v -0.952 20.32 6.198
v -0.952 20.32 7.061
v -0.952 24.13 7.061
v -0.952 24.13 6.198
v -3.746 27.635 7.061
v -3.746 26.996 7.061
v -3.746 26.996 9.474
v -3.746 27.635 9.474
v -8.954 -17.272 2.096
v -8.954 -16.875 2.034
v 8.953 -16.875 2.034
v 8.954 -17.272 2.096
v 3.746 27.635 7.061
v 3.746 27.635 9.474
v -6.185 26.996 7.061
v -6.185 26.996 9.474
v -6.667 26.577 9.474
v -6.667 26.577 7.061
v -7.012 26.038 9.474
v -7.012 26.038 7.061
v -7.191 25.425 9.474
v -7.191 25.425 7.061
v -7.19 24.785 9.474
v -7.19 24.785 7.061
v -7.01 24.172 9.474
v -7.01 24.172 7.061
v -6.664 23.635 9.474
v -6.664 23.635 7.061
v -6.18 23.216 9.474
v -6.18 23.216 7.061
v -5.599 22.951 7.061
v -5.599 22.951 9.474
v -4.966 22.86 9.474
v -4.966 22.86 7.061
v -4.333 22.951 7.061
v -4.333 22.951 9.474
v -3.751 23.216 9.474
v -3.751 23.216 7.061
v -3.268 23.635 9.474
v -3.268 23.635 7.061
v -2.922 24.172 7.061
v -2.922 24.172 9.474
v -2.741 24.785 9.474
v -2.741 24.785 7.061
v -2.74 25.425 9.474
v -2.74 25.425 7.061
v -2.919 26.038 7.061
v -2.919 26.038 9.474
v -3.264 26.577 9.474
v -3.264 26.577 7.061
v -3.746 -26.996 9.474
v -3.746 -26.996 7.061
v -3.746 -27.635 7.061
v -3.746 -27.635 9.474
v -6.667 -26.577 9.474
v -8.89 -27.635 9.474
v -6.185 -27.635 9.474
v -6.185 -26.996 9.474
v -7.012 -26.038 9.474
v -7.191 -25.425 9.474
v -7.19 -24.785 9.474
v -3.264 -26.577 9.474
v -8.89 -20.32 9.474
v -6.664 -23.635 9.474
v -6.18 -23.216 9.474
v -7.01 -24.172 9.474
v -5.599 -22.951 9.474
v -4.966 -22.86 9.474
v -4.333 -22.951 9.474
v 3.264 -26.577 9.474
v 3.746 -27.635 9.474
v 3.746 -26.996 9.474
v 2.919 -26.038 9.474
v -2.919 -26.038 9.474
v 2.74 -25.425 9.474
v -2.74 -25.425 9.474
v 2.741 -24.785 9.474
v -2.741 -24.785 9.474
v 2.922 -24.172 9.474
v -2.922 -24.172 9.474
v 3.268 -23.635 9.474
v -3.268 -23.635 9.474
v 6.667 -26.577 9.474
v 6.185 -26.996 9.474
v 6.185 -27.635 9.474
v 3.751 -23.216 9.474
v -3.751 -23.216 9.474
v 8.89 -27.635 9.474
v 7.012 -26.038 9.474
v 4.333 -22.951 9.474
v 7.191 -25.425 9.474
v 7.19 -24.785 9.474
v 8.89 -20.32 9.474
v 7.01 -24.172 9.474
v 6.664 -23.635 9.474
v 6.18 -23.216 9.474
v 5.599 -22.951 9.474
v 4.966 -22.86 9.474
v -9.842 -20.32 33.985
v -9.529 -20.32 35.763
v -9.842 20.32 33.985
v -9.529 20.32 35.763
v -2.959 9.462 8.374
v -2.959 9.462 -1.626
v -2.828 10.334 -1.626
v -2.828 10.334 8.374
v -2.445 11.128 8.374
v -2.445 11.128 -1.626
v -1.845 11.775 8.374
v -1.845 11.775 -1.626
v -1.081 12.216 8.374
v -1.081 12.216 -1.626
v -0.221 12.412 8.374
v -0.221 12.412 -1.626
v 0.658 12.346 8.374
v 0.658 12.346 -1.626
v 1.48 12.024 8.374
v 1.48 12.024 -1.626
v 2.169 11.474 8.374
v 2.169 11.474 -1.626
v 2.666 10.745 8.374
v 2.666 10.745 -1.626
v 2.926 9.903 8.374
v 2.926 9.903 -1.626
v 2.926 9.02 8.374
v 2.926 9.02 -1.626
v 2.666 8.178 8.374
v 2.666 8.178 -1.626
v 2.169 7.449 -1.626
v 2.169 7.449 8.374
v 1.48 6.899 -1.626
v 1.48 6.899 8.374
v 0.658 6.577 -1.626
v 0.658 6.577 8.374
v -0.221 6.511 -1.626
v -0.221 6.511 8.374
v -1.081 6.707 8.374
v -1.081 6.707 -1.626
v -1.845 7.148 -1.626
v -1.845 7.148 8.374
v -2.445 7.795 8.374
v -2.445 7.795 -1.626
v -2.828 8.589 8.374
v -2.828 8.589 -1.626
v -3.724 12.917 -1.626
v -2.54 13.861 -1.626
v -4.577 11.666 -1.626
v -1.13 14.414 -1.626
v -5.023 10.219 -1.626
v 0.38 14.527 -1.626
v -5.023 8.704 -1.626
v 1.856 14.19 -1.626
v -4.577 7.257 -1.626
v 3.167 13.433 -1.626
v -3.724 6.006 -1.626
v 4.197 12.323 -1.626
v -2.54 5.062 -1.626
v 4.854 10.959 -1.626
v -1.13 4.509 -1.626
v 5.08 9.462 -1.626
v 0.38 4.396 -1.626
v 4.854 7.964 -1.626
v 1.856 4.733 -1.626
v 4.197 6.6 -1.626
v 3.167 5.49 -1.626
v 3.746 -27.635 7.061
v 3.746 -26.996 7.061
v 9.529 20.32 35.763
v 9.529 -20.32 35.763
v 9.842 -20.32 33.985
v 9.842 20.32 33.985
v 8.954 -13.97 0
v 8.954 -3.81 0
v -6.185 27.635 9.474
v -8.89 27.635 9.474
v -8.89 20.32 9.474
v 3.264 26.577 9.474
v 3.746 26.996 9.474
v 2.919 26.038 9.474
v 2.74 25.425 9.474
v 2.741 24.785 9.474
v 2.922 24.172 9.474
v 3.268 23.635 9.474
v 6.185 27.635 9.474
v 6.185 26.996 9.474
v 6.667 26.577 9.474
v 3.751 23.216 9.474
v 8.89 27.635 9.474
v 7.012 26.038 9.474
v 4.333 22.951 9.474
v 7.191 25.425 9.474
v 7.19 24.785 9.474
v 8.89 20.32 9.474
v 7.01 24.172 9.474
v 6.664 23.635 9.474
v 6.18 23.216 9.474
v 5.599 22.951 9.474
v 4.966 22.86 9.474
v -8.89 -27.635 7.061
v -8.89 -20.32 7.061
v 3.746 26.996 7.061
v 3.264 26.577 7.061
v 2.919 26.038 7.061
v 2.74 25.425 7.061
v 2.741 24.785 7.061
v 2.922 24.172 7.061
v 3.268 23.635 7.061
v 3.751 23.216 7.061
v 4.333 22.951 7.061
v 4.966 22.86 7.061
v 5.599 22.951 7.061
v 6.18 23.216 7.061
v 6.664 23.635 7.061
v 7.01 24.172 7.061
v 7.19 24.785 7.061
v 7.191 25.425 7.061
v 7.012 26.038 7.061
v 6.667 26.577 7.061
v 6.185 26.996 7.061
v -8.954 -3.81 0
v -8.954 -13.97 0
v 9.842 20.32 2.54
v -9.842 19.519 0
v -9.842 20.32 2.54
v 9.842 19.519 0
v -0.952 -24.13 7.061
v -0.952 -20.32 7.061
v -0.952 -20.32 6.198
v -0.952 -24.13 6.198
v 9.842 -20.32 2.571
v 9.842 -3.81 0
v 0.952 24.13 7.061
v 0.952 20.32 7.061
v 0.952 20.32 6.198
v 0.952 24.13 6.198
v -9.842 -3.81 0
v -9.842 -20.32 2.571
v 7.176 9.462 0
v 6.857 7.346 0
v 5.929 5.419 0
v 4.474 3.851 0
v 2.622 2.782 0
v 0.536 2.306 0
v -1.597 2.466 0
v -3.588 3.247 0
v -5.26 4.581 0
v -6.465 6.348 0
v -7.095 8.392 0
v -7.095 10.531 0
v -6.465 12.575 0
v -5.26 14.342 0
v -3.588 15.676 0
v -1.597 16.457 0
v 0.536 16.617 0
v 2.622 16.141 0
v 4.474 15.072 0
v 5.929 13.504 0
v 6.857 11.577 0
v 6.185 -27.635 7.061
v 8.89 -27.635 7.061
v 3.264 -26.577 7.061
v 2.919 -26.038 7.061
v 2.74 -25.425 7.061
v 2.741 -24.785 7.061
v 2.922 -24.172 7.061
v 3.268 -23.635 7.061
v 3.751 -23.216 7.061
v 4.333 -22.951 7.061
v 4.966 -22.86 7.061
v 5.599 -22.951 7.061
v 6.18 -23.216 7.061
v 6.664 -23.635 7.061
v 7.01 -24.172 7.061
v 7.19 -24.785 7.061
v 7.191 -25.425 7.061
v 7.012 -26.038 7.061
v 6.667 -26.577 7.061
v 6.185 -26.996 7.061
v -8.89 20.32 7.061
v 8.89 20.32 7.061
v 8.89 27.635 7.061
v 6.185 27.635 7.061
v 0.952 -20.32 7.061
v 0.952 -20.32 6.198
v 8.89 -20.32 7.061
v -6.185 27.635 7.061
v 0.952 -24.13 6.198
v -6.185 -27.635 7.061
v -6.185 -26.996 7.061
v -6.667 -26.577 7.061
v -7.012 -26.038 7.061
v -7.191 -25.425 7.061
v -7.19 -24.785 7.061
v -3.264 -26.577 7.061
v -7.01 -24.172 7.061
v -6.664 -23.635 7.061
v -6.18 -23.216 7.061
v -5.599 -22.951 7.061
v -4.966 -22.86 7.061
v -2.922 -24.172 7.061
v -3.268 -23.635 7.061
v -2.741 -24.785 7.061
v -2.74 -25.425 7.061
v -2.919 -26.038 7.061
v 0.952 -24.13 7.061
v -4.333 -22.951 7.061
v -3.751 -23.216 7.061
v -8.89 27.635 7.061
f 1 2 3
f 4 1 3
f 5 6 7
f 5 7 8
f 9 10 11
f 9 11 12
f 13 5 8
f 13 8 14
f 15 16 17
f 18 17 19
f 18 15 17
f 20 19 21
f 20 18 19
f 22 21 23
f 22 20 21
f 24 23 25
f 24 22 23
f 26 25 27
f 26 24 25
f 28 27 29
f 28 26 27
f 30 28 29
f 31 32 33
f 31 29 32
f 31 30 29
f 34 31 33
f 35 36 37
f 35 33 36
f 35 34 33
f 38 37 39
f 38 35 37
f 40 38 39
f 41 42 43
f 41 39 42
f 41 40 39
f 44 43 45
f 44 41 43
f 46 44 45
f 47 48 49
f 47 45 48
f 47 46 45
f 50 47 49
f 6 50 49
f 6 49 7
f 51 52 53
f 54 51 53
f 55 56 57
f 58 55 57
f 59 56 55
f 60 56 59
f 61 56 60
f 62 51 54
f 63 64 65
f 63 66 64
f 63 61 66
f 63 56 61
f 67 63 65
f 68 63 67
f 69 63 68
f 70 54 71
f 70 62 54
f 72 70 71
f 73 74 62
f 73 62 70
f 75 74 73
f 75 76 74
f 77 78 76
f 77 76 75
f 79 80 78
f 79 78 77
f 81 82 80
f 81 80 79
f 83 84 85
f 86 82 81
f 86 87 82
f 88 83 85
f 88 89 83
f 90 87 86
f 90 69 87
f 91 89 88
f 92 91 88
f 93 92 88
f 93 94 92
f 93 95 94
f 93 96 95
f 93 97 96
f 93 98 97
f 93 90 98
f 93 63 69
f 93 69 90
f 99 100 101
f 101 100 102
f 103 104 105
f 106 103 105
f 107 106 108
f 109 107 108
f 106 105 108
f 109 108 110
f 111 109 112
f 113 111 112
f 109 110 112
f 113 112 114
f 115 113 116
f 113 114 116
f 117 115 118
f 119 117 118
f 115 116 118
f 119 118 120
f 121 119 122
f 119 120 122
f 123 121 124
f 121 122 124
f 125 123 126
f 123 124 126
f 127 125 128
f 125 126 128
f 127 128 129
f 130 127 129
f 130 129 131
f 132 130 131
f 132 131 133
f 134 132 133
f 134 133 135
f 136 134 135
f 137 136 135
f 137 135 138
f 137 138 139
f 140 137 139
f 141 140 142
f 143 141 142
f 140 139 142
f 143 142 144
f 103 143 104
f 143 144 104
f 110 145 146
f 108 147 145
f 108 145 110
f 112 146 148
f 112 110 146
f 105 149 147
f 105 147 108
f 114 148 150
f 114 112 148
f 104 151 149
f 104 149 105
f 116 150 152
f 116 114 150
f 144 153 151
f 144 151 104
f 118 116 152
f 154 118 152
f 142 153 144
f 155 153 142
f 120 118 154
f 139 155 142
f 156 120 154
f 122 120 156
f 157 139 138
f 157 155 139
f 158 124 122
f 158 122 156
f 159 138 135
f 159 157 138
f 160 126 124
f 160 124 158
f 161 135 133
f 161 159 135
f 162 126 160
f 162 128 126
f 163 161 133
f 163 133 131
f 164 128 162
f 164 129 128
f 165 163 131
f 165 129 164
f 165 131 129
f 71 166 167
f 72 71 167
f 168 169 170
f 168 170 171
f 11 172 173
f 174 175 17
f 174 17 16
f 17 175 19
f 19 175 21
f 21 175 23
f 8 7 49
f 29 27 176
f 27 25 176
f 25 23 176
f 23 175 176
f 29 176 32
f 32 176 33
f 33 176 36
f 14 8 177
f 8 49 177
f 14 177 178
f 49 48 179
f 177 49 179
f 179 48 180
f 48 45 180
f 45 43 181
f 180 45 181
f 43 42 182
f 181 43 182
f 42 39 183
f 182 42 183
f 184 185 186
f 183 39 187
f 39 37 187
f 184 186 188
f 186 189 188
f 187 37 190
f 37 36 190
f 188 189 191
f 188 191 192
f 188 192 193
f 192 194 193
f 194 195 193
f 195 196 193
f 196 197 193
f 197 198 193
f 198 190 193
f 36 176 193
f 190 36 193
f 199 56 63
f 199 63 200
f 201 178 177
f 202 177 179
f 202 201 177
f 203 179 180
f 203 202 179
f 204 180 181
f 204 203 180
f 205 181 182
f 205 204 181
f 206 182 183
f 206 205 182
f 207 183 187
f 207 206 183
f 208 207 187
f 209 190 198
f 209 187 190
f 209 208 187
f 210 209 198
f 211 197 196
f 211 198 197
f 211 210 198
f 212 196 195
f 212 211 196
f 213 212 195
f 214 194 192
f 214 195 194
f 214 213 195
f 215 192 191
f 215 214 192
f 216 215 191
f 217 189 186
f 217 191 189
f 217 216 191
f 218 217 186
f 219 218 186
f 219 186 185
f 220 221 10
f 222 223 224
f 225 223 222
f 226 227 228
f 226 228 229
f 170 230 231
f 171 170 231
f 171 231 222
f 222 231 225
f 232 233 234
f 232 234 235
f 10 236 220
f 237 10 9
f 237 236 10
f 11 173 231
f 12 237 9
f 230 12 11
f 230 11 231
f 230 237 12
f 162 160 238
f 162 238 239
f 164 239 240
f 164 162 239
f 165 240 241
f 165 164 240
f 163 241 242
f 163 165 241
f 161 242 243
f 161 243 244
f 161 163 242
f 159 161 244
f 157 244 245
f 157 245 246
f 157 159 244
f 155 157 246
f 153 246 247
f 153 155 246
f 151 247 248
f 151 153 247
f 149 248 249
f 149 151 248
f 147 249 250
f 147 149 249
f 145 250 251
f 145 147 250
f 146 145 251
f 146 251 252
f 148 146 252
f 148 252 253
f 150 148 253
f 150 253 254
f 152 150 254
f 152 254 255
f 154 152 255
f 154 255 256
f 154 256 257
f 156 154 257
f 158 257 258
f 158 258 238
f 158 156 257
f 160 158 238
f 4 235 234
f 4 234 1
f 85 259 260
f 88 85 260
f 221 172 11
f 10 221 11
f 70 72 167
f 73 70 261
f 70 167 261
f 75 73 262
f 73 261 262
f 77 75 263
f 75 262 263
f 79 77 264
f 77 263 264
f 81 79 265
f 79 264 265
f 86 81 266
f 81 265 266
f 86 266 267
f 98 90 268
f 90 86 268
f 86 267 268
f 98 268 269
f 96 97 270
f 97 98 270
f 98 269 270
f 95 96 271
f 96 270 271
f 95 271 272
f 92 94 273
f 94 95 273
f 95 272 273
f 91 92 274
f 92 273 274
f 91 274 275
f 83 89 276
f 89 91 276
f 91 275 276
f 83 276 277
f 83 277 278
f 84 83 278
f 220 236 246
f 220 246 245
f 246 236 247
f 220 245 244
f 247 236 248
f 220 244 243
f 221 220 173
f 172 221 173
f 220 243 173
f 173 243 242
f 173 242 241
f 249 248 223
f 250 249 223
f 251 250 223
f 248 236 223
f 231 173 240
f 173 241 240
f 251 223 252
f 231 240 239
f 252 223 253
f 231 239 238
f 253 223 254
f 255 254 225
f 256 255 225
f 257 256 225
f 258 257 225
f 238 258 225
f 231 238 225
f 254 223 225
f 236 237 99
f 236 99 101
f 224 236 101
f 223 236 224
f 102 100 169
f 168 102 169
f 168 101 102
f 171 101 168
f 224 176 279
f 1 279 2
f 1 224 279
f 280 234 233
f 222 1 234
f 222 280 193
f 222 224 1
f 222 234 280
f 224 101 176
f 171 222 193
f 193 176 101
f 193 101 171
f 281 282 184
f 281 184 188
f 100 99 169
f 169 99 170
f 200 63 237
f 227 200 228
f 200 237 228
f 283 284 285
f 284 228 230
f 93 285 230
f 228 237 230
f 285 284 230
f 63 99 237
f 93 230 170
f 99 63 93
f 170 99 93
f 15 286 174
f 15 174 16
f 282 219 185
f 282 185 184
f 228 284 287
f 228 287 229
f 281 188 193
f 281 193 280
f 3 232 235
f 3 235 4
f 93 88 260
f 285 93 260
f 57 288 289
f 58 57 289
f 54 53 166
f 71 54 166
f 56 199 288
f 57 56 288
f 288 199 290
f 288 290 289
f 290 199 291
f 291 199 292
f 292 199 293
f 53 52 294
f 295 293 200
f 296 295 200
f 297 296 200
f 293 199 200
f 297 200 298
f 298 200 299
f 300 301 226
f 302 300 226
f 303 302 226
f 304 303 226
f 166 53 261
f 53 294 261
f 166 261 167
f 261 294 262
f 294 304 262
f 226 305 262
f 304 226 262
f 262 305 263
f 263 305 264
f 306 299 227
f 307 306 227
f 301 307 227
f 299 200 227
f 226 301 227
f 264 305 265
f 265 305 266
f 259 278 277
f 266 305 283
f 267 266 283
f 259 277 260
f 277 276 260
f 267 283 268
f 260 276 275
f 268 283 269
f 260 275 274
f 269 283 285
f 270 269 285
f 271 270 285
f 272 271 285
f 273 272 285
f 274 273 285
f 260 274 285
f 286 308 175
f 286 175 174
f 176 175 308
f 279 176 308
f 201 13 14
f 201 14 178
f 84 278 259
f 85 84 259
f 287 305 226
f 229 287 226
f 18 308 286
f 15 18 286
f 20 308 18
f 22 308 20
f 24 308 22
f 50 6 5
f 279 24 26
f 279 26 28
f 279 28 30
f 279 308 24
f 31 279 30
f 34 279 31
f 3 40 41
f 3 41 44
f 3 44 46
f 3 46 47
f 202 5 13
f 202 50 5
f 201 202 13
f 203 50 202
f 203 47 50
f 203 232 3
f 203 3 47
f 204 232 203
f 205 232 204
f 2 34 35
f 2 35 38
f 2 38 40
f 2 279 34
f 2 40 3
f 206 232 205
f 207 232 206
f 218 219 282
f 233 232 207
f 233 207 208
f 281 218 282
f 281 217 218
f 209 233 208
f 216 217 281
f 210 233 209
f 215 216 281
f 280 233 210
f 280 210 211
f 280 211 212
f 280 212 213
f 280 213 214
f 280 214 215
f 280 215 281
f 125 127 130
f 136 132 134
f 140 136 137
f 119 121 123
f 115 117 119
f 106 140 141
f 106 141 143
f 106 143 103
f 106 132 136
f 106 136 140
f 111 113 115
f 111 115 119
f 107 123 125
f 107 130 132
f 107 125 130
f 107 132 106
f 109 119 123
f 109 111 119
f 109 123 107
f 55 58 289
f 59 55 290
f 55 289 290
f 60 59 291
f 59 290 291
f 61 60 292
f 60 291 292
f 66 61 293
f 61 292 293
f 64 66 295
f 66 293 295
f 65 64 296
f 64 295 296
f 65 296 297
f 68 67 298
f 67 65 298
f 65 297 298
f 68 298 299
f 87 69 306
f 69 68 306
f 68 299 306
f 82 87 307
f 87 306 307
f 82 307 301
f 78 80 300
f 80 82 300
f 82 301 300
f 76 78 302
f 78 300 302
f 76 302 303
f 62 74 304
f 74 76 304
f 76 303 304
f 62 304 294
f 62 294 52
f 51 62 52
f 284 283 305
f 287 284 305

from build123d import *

# Parameters (mm, degrees)
SKETCH1_W          = 19.685
SKETCH1_H          = 40.64
EXTRUDE1_DEPTH     = 35.7632
CHAMFER1_SIZE      = 1.778
CHAMFER1_SIZE2     = 0.313509372
CHAMFER2_SIZE      = 1.778
CHAMFER2_SIZE2     = 0.313509372
CHAMFER3_SIZE      = 16.51
CHAMFER3_SIZE2     = 2.570638016
EXTRUDE2_REACH     = 44.294
SKETCH2_W          = 17.907
SKETCH2_H          = 14.732
CHAMFER4_SIZE      = 3.302
CHAMFER4_SIZE_2    = 2.312085291
SKETCH3_R          = 7.1755
EXTRUDE3_DEPTH     = 1.6256
CHAMFER5_SIZE      = 2.54
CHAMFER5_SIZE2     = 0.800858924
CHAMFER6_SIZE2     = 2.0955
CHAMFER6_SIZE      = 1.6256
SKETCH4_R          = 2.9591
CUT_EXTRUDE1_DEPTH = 10
SKETCH5_W          = 17.78
SKETCH5_H          = 2.413
EXTRUDE4_DEPTH     = 7.3152
CUT_EXTRUDE2_REACH = 43.041
SKETCH8_W          = 1.905
SKETCH8_H          = 3.81
EXTRUDE5_DEPTH     = 0.8636


# Some blends are built 0.0001 mm under size
with BuildPart() as part:
    # Sketch1 → Extrude1 (new body)
    with BuildSketch(Plane.XY):
        Rectangle(SKETCH1_W, SKETCH1_H)
    extrude(amount=EXTRUDE1_DEPTH)

    # Chamfer1
    chamfer1_edges = [part.edges().sort_by_distance(p)[0] for p in [
        (9.8425, 0, 35.7632),
    ]]
    chamfer1_side = [part.faces().sort_by_distance(p)[0] for p in [
        (9.8425, 0, 17.8816),
    ]]
    chamfer(chamfer1_edges, length=CHAMFER1_SIZE, length2=CHAMFER1_SIZE2, reference=chamfer1_side[0])

    # Chamfer2
    chamfer2_edges = [part.edges().sort_by_distance(p)[0] for p in [
        (-9.8425, 0, 35.7632),
    ]]
    chamfer2_side = [part.faces().sort_by_distance(p)[0] for p in [
        (-9.8425, 0, 17.8816),
    ]]
    chamfer(chamfer2_edges, length=CHAMFER2_SIZE, length2=CHAMFER2_SIZE2, reference=chamfer2_side[0])

    # Chamfer3
    chamfer3_edges = [part.edges().sort_by_distance(p)[0] for p in [
        (0, -20.32, 0),
    ]]
    chamfer3_side = [part.faces().sort_by_distance(p)[0] for p in [
        (0, 0, 0),
    ]]
    chamfer(chamfer3_edges, length=CHAMFER3_SIZE, length2=CHAMFER3_SIZE2, reference=chamfer3_side[0])

    # Sketch2 → Extrude2 (add, up to next)
    with BuildSketch(Plane(origin=(0, 0, 0), x_dir=(-1, 0, 0), z_dir=(0, 0, -1)), mode=Mode.PRIVATE) as extrude2_sk1:
        with Locations((0, -9.906)):
            Rectangle(SKETCH2_W, SKETCH2_H)
    extrude2_tool1 = extrude(extrude2_sk1.sketch, amount=-EXTRUDE2_REACH, mode=Mode.PRIVATE) - part.part
    add(extrude2_tool1.solids().sort_by_distance((0, -9.906, 0))[0])

    # Chamfer4
    # the kernel refuses this chamfer: 3.302, 2.312085291 mm, written as the material it takes off along each edge
    with BuildSketch(Plane(origin=(-17.481087464, -17.272, 0), x_dir=(0, 0.99975333476413, -0.022209674198457065), z_dir=(1, 0, 0))) as chamfer4_piece_1_section:
        Polygon((CHAMFER4_SIZE * 0.999753334764, CHAMFER4_SIZE * 0.0222096741985), (-CHAMFER4_SIZE_2 * 0.0222096742001, CHAMFER4_SIZE_2 * 0.999753334837), (0, 0), align=None)
    chamfer4_piece_1 = extrude(amount=34.962174929, mode=Mode.PRIVATE)
    chamfer4_piece_1 = split(chamfer4_piece_1, bisect_by=Plane(origin=(0, -15.96847592, 1.893097542), z_dir=(0, -0.15384816987279037, -0.9880944998464434)), keep=Keep.TOP, mode=Mode.PRIVATE)
    add(chamfer4_piece_1, mode=Mode.SUBTRACT)

    # Sketch3 → Extrude3 (add)
    with BuildSketch(Plane(origin=(0, 0, 0), x_dir=(-1, 0, 0), z_dir=(0, 0, -1))):
        with Locations(Location((0, 9.4615, 0), (0, 0, 180))):
            Circle(SKETCH3_R)
    extrude(amount=EXTRUDE3_DEPTH)

    # Chamfer5
    chamfer5_edges = [part.edges().sort_by_distance(p)[0] for p in [
        (0, 20.32, 0),
    ]]
    chamfer5_side = [part.faces().sort_by_distance(p)[0] for p in [
        (0, 20.32, 17.867899933),
    ]]
    chamfer(chamfer5_edges, length=CHAMFER5_SIZE, length2=CHAMFER5_SIZE2, reference=chamfer5_side[0])

    # Chamfer6
    chamfer6_edges = [part.edges().sort_by_distance(p)[0] for p in [
        (-7.1755, 9.4615, -1.6256),
    ]]
    chamfer6_side = [part.faces().sort_by_distance(p)[0] for p in [
        (-7.1755, 9.4615, -1.593088),
    ]]
    chamfer(chamfer6_edges, length=CHAMFER6_SIZE - 0.0001, length2=CHAMFER6_SIZE2 - 0.0001, reference=chamfer6_side[0])  # a hair under: the kernel refuses the full size

    # Sketch4 → Cut-Extrude1 (cut)
    with BuildSketch(Plane(origin=(0, 0, -1.6256), x_dir=(-1, 0, 0), z_dir=(0, 0, -1))):
        with Locations((0, 9.4615)):
            Circle(SKETCH4_R)
    extrude(amount=-CUT_EXTRUDE1_DEPTH, mode=Mode.SUBTRACT)

    # Sketch5 → Extrude4 (add)
    with BuildSketch(Plane(origin=(0, 20.32, 0), x_dir=(1, 0, 0), z_dir=(0, 1, 0))):
        with Locations((0, -8.2677)):
            Rectangle(SKETCH5_W, SKETCH5_H)
    extrude4 = extrude(amount=EXTRUDE4_DEPTH)

    # Sketch6 → Cut-Extrude2 (cut, up to next)
    with BuildSketch(Plane(origin=(0, 0, 7.0612), x_dir=(-1, 0, 0), z_dir=(0, 0, -1)), mode=Mode.PRIVATE) as cut_extrude2_sk1:
        with BuildLine():
            Line((-6.1849, 27.6352), (-3.7465, 27.6352))
            Line((-3.7465, 27.6352), (-3.7465, 26.996445941))
            ThreePointArc((-3.7465, 26.996445941), (-4.9657, 22.86), (-6.1849, 26.996445941))
            Line((-6.1849, 26.996445941), (-6.1849, 27.6352))
        make_face()
    cut_extrude2_tool1 = extrude(cut_extrude2_sk1.sketch, amount=-CUT_EXTRUDE2_REACH, mode=Mode.PRIVATE) & part.part
    # Sketch6 → Cut-Extrude2 (cut, up to next)
    with BuildSketch(Plane(origin=(0, 0, 7.0612), x_dir=(-1, 0, 0), z_dir=(0, 0, -1)), mode=Mode.PRIVATE) as cut_extrude2_sk2:
        with BuildLine():
            Line((3.7465, 27.6352), (6.1849, 27.6352))
            Line((6.1849, 27.6352), (6.1849, 26.996445941))
            ThreePointArc((6.1849, 26.996445941), (4.9657, 22.86), (3.7465, 26.996445941))
            Line((3.7465, 26.996445941), (3.7465, 27.6352))
        make_face()
    cut_extrude2_tool2 = extrude(cut_extrude2_sk2.sketch, amount=-CUT_EXTRUDE2_REACH, mode=Mode.PRIVATE) & part.part
    cut_extrude2_1 = cut_extrude2_tool1.solids().sort_by_distance((4.9657, 25.240383, 7.0612))[0]
    add(cut_extrude2_1, mode=Mode.SUBTRACT)
    cut_extrude2_2 = cut_extrude2_tool2.solids().sort_by_distance((-4.9657, 25.240383, 7.0612))[0]
    add(cut_extrude2_2, mode=Mode.SUBTRACT)
    cut_extrude2 = cut_extrude2_1 + cut_extrude2_2  # Cut-Extrude2 as one shape, for the pattern or mirror that repeats it

    # Sketch8 → Extrude5 (add)
    with BuildSketch(Plane(origin=(0, 0, 7.0612), x_dir=(-1, 0, 0), z_dir=(0, 0, -1))):
        with Locations((0, 22.225)):
            Rectangle(SKETCH8_W, SKETCH8_H)
    extrude5 = extrude(amount=EXTRUDE5_DEPTH)

    # Mirror1: Extrude4, Cut-Extrude2, Extrude5 across plane
    add(extrude4.mirror(Plane.ZX))
    add(cut_extrude2.mirror(Plane.ZX), mode=Mode.SUBTRACT)
    add(extrude5.mirror(Plane.ZX))


solid = part.part
